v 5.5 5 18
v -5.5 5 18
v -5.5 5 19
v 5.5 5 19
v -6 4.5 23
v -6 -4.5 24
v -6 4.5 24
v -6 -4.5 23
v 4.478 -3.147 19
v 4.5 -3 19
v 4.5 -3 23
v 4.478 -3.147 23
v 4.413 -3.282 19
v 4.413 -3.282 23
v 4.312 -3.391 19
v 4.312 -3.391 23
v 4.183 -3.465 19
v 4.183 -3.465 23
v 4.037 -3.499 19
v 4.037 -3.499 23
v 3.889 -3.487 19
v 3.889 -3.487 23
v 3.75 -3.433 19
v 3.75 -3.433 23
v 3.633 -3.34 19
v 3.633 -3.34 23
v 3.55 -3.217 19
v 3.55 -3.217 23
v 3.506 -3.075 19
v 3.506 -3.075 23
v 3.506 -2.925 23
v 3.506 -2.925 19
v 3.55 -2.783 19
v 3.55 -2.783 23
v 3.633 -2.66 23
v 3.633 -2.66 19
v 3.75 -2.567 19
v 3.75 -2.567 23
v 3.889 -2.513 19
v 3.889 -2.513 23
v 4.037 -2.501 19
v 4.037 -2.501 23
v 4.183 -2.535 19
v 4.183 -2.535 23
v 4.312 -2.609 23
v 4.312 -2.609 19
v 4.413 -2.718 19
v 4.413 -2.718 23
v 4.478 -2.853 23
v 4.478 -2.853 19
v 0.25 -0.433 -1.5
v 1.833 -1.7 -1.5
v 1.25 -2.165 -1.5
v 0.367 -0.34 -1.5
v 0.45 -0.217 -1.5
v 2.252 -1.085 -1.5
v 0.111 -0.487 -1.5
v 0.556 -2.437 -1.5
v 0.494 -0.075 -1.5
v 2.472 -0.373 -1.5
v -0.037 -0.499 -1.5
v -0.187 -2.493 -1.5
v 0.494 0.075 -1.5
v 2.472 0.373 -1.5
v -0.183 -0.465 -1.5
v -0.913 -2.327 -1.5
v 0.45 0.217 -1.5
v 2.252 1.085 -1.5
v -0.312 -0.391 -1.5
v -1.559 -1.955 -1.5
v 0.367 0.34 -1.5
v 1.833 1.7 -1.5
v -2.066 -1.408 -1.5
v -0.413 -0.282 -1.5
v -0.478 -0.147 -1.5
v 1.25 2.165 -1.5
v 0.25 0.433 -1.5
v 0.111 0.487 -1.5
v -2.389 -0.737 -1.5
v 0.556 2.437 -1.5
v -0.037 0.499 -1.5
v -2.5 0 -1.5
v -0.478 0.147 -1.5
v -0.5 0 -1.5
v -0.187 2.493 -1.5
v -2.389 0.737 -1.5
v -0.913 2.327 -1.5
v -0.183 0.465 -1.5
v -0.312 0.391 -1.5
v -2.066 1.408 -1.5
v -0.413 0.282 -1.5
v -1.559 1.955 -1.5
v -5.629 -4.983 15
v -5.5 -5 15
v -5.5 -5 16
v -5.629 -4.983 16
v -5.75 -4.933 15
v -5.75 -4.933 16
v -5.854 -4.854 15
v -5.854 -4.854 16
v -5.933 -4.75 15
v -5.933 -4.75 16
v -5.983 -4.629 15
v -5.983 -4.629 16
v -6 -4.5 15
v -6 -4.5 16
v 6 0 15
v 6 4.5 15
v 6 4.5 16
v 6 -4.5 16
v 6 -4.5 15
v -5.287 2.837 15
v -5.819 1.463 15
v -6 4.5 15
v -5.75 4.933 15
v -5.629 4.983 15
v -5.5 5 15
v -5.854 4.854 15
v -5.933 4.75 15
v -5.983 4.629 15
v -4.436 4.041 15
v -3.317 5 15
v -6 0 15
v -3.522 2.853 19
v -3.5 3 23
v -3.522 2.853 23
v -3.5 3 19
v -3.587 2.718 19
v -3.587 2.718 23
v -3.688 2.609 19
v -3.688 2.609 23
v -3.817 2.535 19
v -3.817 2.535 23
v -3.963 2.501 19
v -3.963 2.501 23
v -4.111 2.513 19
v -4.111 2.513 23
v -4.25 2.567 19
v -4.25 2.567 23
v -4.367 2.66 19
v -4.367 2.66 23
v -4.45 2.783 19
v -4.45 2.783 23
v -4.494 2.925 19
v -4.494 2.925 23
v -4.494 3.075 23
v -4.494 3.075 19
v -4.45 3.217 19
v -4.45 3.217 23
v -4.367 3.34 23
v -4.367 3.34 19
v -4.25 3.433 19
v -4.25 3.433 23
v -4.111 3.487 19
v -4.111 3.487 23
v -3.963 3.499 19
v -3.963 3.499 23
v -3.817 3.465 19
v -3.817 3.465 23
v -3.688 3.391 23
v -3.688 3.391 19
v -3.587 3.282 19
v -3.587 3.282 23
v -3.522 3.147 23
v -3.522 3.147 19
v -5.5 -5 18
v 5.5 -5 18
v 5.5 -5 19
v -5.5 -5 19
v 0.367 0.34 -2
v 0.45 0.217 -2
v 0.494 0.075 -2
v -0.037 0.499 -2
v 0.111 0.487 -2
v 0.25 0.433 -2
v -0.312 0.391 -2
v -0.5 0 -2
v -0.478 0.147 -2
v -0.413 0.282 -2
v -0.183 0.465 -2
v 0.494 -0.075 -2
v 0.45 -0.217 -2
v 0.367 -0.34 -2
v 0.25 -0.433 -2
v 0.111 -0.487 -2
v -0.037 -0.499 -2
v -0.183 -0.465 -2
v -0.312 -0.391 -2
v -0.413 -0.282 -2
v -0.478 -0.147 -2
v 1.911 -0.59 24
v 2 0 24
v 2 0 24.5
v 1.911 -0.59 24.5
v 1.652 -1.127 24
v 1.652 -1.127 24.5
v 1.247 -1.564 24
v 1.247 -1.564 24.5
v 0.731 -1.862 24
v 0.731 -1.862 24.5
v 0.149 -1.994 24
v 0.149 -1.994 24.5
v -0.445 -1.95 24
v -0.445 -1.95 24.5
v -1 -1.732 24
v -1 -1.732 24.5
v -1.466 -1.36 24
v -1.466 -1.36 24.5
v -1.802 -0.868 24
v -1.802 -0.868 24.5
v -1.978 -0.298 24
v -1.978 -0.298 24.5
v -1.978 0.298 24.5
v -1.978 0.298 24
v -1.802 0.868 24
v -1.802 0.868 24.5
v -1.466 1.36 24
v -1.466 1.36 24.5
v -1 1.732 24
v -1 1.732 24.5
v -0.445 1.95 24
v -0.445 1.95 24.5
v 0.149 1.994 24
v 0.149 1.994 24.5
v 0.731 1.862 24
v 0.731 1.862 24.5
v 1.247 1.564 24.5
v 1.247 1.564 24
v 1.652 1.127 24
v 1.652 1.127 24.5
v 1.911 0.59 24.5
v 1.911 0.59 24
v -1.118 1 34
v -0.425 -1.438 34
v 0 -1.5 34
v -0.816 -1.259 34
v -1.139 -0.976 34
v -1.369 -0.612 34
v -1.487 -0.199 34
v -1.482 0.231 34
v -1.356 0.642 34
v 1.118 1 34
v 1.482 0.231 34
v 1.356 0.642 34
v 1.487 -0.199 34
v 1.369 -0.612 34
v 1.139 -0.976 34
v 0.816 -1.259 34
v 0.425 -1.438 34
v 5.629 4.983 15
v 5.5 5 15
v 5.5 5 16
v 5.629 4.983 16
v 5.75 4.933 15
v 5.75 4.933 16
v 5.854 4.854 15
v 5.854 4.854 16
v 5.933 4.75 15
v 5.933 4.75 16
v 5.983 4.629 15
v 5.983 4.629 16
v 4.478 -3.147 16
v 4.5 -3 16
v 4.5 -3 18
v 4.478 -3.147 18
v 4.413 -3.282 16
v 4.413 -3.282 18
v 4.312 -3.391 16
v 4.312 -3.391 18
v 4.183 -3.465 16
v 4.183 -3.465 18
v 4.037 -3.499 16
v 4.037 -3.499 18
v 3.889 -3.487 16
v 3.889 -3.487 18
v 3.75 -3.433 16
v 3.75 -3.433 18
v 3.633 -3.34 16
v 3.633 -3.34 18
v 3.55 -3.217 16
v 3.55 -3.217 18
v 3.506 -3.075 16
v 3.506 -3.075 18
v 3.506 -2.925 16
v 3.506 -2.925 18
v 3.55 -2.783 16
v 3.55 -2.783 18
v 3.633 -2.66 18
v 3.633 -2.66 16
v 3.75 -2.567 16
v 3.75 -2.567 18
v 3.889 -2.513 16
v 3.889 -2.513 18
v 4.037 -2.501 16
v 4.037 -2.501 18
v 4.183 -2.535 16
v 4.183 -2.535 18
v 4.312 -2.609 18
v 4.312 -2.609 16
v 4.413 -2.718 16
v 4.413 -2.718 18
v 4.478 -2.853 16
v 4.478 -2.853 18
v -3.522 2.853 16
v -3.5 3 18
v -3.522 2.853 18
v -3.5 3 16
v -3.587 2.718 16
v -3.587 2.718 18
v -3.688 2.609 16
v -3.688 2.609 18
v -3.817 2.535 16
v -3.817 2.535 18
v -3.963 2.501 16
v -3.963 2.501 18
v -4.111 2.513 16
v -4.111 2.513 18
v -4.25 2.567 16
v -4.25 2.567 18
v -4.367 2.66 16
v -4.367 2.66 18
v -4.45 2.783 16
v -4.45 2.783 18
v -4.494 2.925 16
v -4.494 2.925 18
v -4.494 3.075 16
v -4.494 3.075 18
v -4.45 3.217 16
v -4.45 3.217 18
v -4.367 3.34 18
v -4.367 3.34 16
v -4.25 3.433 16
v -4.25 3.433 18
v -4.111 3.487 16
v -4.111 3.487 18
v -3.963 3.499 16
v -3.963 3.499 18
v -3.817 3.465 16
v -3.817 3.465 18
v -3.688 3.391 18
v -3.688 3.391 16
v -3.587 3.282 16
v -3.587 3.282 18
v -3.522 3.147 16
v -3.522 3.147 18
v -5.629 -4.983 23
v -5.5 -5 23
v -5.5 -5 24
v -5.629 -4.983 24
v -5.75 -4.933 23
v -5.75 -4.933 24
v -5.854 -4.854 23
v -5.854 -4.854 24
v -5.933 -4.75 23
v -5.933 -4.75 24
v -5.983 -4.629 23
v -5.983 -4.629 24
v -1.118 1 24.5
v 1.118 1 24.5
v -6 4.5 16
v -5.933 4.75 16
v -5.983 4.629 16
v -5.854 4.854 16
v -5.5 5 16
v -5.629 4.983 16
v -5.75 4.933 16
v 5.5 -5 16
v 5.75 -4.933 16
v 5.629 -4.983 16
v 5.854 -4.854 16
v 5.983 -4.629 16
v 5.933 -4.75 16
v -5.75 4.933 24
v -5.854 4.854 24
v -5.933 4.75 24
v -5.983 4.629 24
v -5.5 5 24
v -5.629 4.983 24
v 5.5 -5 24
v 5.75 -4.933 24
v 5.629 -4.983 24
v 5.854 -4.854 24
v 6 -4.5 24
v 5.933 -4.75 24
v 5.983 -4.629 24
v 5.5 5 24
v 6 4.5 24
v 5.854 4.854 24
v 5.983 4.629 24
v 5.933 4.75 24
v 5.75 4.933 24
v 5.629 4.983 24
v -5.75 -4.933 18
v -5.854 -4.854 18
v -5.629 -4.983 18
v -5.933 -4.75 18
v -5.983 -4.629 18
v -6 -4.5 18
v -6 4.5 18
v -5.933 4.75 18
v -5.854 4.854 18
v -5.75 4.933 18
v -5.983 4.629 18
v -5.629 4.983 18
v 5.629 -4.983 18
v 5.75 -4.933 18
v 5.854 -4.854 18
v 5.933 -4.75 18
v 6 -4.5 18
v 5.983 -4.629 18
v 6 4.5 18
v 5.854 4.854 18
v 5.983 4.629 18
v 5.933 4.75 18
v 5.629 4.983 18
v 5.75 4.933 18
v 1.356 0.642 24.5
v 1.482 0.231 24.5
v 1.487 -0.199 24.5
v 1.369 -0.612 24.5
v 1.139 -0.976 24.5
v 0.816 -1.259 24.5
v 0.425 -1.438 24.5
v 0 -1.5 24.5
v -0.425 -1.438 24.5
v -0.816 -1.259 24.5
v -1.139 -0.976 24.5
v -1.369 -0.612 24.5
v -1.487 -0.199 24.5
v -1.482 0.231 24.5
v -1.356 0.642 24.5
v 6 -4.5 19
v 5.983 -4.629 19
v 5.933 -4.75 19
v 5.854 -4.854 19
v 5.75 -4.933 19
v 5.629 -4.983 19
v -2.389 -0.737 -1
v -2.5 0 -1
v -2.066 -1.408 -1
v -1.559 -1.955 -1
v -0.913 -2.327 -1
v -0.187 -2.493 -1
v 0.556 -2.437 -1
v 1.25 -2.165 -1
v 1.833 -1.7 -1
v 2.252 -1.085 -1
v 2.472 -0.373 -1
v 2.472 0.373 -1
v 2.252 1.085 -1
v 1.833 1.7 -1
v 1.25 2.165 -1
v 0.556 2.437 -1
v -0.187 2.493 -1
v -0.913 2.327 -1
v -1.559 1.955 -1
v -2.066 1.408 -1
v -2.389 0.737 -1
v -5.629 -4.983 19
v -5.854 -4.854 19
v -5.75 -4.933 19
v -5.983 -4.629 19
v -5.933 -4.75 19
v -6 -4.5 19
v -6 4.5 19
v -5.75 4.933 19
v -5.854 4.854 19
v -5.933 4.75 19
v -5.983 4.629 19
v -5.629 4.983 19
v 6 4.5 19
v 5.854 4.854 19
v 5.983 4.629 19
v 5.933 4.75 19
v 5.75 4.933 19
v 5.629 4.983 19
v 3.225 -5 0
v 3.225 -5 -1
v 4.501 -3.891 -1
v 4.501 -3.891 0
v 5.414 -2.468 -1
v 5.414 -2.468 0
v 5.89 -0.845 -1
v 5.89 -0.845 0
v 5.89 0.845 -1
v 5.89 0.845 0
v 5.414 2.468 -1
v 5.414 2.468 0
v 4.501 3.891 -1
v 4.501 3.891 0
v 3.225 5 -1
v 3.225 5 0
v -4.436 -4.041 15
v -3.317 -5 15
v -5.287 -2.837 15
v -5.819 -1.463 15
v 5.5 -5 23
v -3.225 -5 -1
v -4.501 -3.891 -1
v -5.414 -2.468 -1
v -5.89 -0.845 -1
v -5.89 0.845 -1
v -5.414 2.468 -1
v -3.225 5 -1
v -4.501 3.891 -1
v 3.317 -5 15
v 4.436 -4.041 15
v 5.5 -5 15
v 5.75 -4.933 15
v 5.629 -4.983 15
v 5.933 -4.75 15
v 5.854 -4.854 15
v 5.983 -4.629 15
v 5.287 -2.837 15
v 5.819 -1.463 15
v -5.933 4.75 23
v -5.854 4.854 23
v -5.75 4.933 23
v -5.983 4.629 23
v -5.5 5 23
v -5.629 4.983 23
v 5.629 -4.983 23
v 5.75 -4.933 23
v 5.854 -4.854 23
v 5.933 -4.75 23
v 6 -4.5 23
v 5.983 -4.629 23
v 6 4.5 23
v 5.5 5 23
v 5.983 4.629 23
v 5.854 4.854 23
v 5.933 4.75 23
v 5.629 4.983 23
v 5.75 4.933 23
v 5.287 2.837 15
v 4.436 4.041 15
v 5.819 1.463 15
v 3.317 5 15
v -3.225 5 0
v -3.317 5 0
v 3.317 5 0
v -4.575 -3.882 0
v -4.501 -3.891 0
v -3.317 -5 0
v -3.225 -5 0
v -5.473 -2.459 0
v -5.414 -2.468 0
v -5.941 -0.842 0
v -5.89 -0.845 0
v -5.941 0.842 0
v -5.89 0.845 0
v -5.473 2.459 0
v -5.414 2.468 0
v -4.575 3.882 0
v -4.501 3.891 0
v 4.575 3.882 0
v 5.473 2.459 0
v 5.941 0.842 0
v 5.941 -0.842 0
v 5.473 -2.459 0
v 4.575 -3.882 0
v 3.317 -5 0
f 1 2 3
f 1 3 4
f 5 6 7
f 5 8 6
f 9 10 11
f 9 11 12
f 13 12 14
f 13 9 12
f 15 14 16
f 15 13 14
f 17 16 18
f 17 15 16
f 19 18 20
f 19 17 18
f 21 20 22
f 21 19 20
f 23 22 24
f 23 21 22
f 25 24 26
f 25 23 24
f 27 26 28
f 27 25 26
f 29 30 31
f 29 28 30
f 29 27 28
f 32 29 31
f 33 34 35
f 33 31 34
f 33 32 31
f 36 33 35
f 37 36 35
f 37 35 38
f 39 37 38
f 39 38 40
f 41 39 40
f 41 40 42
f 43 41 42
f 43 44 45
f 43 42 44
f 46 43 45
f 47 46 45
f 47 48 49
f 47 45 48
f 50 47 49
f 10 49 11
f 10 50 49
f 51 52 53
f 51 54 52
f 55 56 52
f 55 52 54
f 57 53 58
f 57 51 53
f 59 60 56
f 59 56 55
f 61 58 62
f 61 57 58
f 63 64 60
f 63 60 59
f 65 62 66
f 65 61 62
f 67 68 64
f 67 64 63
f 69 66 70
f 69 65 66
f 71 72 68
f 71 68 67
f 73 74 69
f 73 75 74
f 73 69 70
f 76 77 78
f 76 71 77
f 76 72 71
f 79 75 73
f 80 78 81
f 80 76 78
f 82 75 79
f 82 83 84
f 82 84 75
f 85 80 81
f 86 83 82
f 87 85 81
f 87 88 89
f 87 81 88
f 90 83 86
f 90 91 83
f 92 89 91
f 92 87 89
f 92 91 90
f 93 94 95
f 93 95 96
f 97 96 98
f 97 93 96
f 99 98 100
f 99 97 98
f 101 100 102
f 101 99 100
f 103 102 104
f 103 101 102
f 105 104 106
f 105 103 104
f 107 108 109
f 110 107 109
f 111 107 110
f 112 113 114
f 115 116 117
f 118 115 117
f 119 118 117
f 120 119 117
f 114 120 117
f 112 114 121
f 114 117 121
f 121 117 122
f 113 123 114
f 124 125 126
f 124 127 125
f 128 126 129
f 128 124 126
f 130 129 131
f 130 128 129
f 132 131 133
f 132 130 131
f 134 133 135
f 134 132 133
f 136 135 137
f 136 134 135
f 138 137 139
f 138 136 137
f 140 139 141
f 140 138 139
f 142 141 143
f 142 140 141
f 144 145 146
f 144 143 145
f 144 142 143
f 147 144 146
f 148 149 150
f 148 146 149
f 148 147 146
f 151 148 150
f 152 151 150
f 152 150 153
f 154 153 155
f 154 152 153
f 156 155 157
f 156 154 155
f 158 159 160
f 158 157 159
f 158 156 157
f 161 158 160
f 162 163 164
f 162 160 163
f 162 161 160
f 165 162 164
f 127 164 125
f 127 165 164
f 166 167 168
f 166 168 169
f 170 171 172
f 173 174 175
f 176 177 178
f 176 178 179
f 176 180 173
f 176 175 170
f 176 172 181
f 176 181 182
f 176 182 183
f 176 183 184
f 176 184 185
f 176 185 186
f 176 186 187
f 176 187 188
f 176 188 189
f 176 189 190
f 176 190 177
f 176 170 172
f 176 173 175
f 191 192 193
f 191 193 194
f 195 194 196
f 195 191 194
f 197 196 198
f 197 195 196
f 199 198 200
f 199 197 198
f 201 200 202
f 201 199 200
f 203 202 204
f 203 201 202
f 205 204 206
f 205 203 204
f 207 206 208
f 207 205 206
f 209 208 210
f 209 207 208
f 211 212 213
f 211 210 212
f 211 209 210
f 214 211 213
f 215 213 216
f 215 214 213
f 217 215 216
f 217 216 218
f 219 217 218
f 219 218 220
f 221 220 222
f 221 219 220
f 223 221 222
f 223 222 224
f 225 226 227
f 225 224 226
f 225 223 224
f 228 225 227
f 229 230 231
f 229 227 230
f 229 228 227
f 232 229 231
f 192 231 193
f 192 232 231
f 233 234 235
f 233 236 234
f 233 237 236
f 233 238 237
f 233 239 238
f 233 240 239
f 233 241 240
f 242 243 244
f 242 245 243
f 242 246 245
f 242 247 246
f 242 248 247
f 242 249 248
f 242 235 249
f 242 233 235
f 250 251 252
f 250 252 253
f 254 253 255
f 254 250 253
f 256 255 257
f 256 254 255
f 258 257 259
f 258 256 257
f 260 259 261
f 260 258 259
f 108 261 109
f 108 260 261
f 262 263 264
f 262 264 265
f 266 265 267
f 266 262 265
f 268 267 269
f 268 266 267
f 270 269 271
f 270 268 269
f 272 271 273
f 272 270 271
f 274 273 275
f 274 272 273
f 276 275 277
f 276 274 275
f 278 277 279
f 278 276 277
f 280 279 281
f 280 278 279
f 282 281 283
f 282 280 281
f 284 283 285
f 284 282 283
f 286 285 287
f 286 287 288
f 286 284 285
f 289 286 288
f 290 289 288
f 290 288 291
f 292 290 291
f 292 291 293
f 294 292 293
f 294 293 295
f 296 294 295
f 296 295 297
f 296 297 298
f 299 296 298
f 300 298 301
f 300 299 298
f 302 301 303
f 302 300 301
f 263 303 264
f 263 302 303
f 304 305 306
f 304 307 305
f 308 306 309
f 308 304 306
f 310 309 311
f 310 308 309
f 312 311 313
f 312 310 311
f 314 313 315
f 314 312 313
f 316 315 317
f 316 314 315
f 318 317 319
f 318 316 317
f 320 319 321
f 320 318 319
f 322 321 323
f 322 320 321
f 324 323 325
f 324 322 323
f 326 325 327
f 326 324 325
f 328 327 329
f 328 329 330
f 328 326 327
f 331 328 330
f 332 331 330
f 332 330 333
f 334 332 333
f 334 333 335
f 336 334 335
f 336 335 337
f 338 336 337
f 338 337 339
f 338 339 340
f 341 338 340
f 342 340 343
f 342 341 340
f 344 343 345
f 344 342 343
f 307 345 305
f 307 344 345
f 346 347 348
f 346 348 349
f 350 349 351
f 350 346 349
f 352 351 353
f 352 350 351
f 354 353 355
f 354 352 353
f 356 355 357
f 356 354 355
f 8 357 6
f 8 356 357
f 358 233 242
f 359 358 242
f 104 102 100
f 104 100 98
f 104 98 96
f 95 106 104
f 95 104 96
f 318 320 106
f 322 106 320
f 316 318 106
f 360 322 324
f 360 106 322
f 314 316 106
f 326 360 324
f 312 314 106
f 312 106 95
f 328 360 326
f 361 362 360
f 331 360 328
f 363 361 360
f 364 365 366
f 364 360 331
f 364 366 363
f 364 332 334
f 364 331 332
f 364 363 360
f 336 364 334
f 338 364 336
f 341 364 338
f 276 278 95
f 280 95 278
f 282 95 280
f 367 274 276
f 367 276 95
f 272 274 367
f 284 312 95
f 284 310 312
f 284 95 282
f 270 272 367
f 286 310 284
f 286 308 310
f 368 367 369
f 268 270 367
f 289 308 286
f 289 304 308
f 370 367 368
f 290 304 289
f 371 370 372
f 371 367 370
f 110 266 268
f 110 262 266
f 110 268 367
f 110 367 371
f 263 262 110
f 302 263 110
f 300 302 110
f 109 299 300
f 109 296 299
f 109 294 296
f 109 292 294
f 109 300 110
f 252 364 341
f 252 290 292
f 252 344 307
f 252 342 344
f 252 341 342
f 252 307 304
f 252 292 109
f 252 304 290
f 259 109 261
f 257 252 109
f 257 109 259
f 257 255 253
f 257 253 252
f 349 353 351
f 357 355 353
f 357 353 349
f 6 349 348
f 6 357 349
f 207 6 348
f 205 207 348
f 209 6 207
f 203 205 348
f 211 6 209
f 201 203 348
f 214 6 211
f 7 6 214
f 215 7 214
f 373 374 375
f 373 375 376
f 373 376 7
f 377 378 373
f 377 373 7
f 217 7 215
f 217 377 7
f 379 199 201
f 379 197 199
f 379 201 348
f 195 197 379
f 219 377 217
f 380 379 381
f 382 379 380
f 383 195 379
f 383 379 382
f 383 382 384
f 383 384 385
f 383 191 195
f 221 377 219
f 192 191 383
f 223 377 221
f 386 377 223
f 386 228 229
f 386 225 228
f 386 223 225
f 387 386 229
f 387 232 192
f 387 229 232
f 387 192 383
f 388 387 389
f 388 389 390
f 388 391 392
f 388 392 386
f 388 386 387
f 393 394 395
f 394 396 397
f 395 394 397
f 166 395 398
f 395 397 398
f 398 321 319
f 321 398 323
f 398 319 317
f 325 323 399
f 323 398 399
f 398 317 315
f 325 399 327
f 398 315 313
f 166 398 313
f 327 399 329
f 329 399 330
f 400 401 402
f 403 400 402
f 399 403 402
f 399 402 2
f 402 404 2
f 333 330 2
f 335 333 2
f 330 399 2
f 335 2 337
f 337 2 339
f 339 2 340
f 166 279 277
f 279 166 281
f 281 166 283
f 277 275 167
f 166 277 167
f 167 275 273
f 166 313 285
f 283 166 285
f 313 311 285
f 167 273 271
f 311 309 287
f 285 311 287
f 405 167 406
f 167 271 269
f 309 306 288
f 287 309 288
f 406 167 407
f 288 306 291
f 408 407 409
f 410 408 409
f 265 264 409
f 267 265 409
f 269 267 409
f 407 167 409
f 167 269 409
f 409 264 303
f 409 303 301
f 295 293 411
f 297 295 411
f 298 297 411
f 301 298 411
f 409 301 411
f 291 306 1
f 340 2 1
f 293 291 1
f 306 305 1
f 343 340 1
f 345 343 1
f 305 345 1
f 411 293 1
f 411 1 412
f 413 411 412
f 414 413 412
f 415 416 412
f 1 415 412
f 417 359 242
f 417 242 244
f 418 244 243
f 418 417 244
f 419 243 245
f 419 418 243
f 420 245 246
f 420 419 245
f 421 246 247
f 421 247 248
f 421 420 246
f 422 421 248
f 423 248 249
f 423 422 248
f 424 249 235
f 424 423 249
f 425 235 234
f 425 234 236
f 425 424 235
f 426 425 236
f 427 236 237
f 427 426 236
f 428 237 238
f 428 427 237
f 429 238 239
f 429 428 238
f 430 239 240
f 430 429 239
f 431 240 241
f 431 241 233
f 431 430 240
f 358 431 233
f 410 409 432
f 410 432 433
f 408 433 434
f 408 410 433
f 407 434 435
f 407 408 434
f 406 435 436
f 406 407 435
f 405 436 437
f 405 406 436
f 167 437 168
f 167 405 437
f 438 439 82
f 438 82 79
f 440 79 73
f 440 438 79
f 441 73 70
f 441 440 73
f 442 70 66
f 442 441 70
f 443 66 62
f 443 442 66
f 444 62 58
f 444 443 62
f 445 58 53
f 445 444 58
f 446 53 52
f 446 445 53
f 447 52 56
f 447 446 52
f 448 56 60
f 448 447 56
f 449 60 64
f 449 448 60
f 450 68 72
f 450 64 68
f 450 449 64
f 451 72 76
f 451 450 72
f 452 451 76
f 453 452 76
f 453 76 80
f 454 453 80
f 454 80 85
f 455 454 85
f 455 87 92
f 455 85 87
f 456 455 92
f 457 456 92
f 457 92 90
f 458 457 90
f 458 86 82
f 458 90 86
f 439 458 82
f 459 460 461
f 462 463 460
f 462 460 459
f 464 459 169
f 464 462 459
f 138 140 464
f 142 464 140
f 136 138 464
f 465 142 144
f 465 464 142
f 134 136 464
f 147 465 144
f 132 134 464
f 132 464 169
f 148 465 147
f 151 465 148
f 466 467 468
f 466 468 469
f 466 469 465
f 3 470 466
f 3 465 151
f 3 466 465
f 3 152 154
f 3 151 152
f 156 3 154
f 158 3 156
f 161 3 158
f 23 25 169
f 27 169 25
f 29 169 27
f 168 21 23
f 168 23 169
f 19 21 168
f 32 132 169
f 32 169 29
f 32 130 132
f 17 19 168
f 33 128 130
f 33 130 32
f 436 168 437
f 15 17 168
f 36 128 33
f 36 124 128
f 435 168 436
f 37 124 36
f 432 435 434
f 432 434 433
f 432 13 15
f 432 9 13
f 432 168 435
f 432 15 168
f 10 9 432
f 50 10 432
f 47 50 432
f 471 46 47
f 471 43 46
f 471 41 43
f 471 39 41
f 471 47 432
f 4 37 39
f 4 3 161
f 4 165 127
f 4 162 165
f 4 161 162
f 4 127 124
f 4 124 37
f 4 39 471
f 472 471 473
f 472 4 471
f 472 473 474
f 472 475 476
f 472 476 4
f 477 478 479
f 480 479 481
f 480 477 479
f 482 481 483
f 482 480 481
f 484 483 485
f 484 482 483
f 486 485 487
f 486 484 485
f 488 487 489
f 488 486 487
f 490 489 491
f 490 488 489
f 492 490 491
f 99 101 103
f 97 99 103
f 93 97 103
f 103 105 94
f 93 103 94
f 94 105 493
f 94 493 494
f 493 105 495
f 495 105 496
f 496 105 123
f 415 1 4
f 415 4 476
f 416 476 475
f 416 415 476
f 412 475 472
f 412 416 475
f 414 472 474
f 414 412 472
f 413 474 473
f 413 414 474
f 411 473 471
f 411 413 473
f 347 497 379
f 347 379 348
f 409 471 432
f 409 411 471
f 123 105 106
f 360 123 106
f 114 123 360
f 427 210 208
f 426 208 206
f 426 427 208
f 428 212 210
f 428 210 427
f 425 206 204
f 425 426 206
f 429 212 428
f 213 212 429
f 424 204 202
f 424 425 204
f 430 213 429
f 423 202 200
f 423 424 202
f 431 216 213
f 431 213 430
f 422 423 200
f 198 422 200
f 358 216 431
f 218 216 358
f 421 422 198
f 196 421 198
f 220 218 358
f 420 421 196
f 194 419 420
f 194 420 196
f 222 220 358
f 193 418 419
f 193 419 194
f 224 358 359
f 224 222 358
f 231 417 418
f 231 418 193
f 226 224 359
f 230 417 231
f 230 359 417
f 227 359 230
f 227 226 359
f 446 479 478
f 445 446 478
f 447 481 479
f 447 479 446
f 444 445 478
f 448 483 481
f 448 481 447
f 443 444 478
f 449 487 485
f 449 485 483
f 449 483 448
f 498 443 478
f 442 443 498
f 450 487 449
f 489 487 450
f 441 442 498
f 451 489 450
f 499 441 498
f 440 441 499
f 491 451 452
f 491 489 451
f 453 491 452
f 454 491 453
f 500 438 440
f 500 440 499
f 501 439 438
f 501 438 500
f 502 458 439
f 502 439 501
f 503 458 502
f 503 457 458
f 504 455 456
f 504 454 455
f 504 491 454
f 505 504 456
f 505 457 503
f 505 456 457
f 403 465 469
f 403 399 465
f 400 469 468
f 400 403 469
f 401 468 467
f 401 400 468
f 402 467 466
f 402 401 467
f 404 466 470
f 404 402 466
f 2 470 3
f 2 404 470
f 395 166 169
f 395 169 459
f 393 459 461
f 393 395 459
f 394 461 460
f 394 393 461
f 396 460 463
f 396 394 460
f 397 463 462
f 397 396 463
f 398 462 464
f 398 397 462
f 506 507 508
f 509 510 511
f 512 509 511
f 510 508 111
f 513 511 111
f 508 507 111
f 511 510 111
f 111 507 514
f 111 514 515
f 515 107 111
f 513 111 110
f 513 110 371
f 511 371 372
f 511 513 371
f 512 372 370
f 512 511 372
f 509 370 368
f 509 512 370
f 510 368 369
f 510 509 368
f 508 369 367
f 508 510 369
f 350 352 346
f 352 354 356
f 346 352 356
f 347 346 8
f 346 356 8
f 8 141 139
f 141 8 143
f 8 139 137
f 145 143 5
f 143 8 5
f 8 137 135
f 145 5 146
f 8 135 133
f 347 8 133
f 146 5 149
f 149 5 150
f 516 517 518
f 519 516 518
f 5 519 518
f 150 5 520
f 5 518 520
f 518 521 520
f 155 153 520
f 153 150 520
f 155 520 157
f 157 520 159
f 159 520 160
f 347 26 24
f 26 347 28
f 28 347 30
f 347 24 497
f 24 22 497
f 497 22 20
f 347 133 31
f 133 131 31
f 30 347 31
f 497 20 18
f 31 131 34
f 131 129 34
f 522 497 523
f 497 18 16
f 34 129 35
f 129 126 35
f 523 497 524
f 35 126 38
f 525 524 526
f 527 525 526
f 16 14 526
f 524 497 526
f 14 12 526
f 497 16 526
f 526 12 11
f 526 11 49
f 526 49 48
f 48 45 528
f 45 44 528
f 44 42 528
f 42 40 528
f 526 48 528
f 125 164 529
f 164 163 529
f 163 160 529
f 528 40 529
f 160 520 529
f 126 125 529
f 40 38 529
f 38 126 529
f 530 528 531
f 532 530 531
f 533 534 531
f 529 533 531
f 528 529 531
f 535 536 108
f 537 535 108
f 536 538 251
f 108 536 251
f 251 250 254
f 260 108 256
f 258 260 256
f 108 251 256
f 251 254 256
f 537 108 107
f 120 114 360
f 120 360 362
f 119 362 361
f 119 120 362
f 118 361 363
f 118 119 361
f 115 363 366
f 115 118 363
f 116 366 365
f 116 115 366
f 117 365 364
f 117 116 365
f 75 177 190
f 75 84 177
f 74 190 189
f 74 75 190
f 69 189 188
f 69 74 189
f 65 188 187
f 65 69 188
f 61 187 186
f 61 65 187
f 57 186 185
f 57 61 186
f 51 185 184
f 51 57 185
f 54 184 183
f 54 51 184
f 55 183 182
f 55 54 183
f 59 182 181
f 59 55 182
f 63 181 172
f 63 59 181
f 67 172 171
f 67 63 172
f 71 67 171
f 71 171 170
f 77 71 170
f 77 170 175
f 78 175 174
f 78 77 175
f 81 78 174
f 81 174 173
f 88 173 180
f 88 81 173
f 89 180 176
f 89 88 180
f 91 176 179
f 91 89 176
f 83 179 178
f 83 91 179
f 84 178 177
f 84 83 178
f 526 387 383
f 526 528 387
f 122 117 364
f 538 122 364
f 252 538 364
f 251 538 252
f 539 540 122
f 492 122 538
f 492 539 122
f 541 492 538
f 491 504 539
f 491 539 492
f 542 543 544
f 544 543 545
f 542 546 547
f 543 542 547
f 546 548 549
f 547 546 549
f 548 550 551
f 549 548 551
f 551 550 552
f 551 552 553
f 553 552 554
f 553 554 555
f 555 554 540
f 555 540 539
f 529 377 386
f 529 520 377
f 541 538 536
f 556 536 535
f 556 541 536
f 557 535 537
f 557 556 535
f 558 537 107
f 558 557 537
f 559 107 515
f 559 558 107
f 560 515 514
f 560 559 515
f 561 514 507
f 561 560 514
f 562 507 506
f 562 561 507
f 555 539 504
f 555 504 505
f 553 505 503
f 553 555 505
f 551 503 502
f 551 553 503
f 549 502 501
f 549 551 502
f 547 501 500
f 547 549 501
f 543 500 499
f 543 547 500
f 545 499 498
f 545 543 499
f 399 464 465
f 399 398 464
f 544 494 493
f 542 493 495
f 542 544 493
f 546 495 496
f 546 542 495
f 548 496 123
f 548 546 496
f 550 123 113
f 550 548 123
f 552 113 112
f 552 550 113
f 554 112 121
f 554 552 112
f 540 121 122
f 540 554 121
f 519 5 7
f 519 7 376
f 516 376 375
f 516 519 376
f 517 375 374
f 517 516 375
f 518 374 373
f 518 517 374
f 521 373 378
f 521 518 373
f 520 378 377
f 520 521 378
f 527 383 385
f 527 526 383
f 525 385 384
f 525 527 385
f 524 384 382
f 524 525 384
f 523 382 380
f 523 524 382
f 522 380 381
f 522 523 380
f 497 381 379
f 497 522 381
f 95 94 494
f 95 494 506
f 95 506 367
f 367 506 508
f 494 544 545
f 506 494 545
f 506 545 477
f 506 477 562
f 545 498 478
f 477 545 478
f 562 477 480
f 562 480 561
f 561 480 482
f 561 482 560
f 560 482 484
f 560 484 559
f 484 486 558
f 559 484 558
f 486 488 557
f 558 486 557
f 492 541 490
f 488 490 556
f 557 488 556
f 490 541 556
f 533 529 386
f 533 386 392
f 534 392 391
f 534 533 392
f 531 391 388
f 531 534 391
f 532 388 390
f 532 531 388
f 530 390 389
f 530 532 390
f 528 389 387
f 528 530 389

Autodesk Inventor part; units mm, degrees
ref_plane "YZ Plane" through (0, 0, 0) normal (1, 0, 0) x (0, 1, 0)
ref_plane "XZ Plane" through (0, 0, 0) normal (0, 1, 0) x (-1, 0, 0)
ref_plane "XY Plane" through (0, 0, 0) normal (0, 0, 1) x (1, 0, 0)
sketch "Sketch1" plane through (0, 0, 0) normal (0, 0, 1) x (1, 0, 0)
  circle A0 centre (0, 0) radius 6
  line L0 (0, 0) -> (0, 5)
  line L1 (0, 5) -> (3.3166, 5)
  line L2 (0, 5) -> (-3.3166, 5)
  line L3 (0, 0) -> (0, -5)
  line L4 (0, -5) -> (3.3166, -5)
  line L5 (0, -5) -> (-3.3166, -5)
  dimension "d0" = 12
  dimension "d1" = 5
  dimension "d2" = 5
extrude "Extrusion1" add sketch "Sketch1" along normal blind 15 contours A0 L4 L3 L0 L1 | L2 L0 L3 L5 A0
sketch "Sketch2" plane through (0, 0, 15) normal (0, 0, 1) x (1, 0, 0)
  arc A0 (-3.3166, 5) -> (-3.3166, -5) centre (0, 0) ccw projected
  line L0 (-6, 0) -> (-6, 4.5)
  line L1 (-5.5, 5) -> (5.5, 5)
  line L2 (6, 4.5) -> (6, -4.5)
  line L3 (5.5, -5) -> (-5.5, -5)
  line L4 (-6, -4.5) -> (-6, 5)
  arc A1 (-5.5, 5) -> (-6, 4.5) centre (-5.5, 4.5) ccw
  arc A2 (-6, -4.5) -> (-5.5, -5) centre (-5.5, -4.5) ccw
  arc A3 (5.5, -5) -> (6, -4.5) centre (5.5, -4.5) ccw
  arc A4 (6, 4.5) -> (5.5, 5) centre (5.5, 4.5) ccw
  point P0 (6, -5)
  point P1 (-6, -5)
  dimension "d5" = 12
  dimension "d6" = 0.5
  dimension "d32" = 10
  dimension "d33" = 5
extrude "Extrusion2" add sketch "Sketch2" along normal blind 1
sketch "Sketch3" plane through (0, 0, 16) normal (0, 0, 1) x (1, 0, 0)
  line L0 (0, 0) -> (-4, 0)
  line L1 (-4, 0) -> (-4, 3)
  line L2 (0, 0) -> (0, -3)
  line L3 (0, -3) -> (4, -3)
  circle A0 centre (-4, 3) radius 0.5
  circle A1 centre (4, -3) radius 0.5
  dimension "d9" = 4
  dimension "d10" = 3
  dimension "d11" = 3
  dimension "d12" = 4
  dimension "d13" = 1
  dimension "d14" = 1
extrude "Extrusion3" add sketch "Sketch3" along normal blind 2
sketch "Sketch4" plane through (-4, 3, 18) normal (0, 0, 1) x (1, 0, 0)
  line L0 (-1.5, 2) -> (9.5, 2)
  line L1 (10, 1.5) -> (10, -7.5)
  line L2 (9.5, -8) -> (-1.5, -8)
  line L3 (-2, -7.5) -> (-2, 1.5)
  arc A0 (-1.5, 2) -> (-2, 1.5) centre (-1.5, 1.5) ccw
  arc A1 (-2, -7.5) -> (-1.5, -8) centre (-1.5, -7.5) ccw
  arc A2 (9.5, -8) -> (10, -7.5) centre (9.5, -7.5) ccw
  arc A3 (10, 1.5) -> (9.5, 2) centre (9.5, 1.5) ccw
  line L4 (-1.5, -8) -> (9.5, -8) projected
  line L5 (-2, 1.5) -> (-2, -7.5) projected
  point P0 (4, -3)
  dimension "d17" = 0.5
  dimension "d36" = 10
  dimension "d37" = 12
  dimension "d38" = 0
  dimension "d39" = 0
extrude "Extrusion4" add sketch "Sketch4" along normal blind 1
sketch "Sketch5" plane through (-4, 3, 19) normal (0, 0, 1) x (1, 0, 0)
  circle A0 centre (0, 0) radius 0.5 projected
  circle A1 centre (0, 0) radius 0.5
  circle A2 centre (8, -6) radius 0.5 projected
  circle A3 centre (8, -6) radius 0.5
  point P0 (4, -3)
  point P1 (7.9, -5.5101)
  point P2 (7.9, -6.4899)
extrude "Extrusion5" add sketch "Sketch5" along normal blind 4
sketch "Sketch6" plane through (-4, 3, 23) normal (0, 0, 1) x (1, 0, 0)
  line L0 (-1.5, 2) -> (9.5, 2)
  line L1 (10, 1.5) -> (10, -7.5)
  line L2 (9.5, -8) -> (-1.5, -8)
  line L3 (-2, -7.5) -> (-2, 1.5)
  arc A0 (-1.5, 2) -> (-2, 1.5) centre (-1.5, 1.5) ccw
  arc A1 (10, 1.5) -> (9.5, 2) centre (9.5, 1.5) ccw
  arc A2 (9.5, -8) -> (10, -7.5) centre (9.5, -7.5) ccw
  arc A3 (-2, -7.5) -> (-1.5, -8) centre (-1.5, -7.5) ccw
  line L4 (-1.5, -8) -> (9.5, -8) projected
  line L5 (-2, 1.5) -> (-2, -7.5) projected
  point P0 (4, -3)
  dimension "d22" = 0.5
  dimension "d40" = 10
  dimension "d41" = 12
  dimension "d42" = 0
  dimension "d43" = 0
extrude "Extrusion6" add sketch "Sketch6" along normal blind 1
sketch "Sketch7" plane through (-4, 3, 24) normal (0, 0, 1) x (1, 0, 0)
  circle A0 centre (4, -3) radius 1.5
  line L0 (4, -3) -> (4, -2)
  line L1 (4, -2) -> (5.118, -2)
  line L2 (4, -2) -> (2.882, -2)
  dimension "d25" = 3
  dimension "d26" = 1
extrude "Extrusion7" add sketch "Sketch7" along normal blind 10 contours A0 L2 L1 picked at (3.9981, -3.6594)
sketch "Sketch8" plane through (0, 0, 0) normal (0, 0, -1) x (-1, 0, 0)
  circle A0 centre (0, 0) radius 5.95
  line L0 (0, 0) -> (0, -5)
  line L1 (3.3166, -5) -> (-3.3166, -5) projected
  line L2 (0, -5) -> (3.3166, -5)
  line L3 (3.3166, -5) -> (-3.2253, -5)
  line L4 (0, 0) -> (0, 5)
  line L5 (-3.3166, 5) -> (3.3166, 5) projected
  line L6 (3.289, 4.9583) -> (-3.289, 4.9583)
  point P0 (-3.2253, -5)
  point P1 (3.2253, -5)
  point P2 (3.2253, 5)
  point P3 (-3.2253, 5)
  dimension "d35" = 11.9
  dimension "d34" = 5
extrude "Extrusion8" add sketch "Sketch8" along normal blind 1 contours A0 L1 L0 L4 L6 | L6 L4 L5 A0 | L6 A0 L5 L4 | L4 L0 L1 A0 L6
sketch "Sketch9" plane through (0, 0, -1) normal (0, 0, -1) x (-1, 0, 0)
  arc A0 (-1.118, 1) -> (1.118, 1) centre (0, 0) ccw projected
  circle A1 centre (0, 0) radius 2.5
  dimension "d44" = 5
extrude "Extrusion9" add sketch "Sketch9" along normal blind 0.5
sketch "Sketch10" plane through (0, 0, -1.5) normal (0, 0, -1) x (-1, 0, 0)
  circle A0 centre (0, 0) radius 0.5
  dimension "d47" = 1
extrude "Extrusion10" add sketch "Sketch10" along normal blind 0.5
sketch "Sketch11" plane through (-4, 3, 24) normal (0, 0, 1) x (1, 0, 0)
  arc A0 (2.882, -2) -> (5.118, -2) centre (4, -3) ccw projected
  circle A1 centre (4, -3) radius 2
  dimension "d50" = 4
extrude "Extrusion11" add sketch "Sketch11" along normal blind 0.5
properties part number "minimotor"
